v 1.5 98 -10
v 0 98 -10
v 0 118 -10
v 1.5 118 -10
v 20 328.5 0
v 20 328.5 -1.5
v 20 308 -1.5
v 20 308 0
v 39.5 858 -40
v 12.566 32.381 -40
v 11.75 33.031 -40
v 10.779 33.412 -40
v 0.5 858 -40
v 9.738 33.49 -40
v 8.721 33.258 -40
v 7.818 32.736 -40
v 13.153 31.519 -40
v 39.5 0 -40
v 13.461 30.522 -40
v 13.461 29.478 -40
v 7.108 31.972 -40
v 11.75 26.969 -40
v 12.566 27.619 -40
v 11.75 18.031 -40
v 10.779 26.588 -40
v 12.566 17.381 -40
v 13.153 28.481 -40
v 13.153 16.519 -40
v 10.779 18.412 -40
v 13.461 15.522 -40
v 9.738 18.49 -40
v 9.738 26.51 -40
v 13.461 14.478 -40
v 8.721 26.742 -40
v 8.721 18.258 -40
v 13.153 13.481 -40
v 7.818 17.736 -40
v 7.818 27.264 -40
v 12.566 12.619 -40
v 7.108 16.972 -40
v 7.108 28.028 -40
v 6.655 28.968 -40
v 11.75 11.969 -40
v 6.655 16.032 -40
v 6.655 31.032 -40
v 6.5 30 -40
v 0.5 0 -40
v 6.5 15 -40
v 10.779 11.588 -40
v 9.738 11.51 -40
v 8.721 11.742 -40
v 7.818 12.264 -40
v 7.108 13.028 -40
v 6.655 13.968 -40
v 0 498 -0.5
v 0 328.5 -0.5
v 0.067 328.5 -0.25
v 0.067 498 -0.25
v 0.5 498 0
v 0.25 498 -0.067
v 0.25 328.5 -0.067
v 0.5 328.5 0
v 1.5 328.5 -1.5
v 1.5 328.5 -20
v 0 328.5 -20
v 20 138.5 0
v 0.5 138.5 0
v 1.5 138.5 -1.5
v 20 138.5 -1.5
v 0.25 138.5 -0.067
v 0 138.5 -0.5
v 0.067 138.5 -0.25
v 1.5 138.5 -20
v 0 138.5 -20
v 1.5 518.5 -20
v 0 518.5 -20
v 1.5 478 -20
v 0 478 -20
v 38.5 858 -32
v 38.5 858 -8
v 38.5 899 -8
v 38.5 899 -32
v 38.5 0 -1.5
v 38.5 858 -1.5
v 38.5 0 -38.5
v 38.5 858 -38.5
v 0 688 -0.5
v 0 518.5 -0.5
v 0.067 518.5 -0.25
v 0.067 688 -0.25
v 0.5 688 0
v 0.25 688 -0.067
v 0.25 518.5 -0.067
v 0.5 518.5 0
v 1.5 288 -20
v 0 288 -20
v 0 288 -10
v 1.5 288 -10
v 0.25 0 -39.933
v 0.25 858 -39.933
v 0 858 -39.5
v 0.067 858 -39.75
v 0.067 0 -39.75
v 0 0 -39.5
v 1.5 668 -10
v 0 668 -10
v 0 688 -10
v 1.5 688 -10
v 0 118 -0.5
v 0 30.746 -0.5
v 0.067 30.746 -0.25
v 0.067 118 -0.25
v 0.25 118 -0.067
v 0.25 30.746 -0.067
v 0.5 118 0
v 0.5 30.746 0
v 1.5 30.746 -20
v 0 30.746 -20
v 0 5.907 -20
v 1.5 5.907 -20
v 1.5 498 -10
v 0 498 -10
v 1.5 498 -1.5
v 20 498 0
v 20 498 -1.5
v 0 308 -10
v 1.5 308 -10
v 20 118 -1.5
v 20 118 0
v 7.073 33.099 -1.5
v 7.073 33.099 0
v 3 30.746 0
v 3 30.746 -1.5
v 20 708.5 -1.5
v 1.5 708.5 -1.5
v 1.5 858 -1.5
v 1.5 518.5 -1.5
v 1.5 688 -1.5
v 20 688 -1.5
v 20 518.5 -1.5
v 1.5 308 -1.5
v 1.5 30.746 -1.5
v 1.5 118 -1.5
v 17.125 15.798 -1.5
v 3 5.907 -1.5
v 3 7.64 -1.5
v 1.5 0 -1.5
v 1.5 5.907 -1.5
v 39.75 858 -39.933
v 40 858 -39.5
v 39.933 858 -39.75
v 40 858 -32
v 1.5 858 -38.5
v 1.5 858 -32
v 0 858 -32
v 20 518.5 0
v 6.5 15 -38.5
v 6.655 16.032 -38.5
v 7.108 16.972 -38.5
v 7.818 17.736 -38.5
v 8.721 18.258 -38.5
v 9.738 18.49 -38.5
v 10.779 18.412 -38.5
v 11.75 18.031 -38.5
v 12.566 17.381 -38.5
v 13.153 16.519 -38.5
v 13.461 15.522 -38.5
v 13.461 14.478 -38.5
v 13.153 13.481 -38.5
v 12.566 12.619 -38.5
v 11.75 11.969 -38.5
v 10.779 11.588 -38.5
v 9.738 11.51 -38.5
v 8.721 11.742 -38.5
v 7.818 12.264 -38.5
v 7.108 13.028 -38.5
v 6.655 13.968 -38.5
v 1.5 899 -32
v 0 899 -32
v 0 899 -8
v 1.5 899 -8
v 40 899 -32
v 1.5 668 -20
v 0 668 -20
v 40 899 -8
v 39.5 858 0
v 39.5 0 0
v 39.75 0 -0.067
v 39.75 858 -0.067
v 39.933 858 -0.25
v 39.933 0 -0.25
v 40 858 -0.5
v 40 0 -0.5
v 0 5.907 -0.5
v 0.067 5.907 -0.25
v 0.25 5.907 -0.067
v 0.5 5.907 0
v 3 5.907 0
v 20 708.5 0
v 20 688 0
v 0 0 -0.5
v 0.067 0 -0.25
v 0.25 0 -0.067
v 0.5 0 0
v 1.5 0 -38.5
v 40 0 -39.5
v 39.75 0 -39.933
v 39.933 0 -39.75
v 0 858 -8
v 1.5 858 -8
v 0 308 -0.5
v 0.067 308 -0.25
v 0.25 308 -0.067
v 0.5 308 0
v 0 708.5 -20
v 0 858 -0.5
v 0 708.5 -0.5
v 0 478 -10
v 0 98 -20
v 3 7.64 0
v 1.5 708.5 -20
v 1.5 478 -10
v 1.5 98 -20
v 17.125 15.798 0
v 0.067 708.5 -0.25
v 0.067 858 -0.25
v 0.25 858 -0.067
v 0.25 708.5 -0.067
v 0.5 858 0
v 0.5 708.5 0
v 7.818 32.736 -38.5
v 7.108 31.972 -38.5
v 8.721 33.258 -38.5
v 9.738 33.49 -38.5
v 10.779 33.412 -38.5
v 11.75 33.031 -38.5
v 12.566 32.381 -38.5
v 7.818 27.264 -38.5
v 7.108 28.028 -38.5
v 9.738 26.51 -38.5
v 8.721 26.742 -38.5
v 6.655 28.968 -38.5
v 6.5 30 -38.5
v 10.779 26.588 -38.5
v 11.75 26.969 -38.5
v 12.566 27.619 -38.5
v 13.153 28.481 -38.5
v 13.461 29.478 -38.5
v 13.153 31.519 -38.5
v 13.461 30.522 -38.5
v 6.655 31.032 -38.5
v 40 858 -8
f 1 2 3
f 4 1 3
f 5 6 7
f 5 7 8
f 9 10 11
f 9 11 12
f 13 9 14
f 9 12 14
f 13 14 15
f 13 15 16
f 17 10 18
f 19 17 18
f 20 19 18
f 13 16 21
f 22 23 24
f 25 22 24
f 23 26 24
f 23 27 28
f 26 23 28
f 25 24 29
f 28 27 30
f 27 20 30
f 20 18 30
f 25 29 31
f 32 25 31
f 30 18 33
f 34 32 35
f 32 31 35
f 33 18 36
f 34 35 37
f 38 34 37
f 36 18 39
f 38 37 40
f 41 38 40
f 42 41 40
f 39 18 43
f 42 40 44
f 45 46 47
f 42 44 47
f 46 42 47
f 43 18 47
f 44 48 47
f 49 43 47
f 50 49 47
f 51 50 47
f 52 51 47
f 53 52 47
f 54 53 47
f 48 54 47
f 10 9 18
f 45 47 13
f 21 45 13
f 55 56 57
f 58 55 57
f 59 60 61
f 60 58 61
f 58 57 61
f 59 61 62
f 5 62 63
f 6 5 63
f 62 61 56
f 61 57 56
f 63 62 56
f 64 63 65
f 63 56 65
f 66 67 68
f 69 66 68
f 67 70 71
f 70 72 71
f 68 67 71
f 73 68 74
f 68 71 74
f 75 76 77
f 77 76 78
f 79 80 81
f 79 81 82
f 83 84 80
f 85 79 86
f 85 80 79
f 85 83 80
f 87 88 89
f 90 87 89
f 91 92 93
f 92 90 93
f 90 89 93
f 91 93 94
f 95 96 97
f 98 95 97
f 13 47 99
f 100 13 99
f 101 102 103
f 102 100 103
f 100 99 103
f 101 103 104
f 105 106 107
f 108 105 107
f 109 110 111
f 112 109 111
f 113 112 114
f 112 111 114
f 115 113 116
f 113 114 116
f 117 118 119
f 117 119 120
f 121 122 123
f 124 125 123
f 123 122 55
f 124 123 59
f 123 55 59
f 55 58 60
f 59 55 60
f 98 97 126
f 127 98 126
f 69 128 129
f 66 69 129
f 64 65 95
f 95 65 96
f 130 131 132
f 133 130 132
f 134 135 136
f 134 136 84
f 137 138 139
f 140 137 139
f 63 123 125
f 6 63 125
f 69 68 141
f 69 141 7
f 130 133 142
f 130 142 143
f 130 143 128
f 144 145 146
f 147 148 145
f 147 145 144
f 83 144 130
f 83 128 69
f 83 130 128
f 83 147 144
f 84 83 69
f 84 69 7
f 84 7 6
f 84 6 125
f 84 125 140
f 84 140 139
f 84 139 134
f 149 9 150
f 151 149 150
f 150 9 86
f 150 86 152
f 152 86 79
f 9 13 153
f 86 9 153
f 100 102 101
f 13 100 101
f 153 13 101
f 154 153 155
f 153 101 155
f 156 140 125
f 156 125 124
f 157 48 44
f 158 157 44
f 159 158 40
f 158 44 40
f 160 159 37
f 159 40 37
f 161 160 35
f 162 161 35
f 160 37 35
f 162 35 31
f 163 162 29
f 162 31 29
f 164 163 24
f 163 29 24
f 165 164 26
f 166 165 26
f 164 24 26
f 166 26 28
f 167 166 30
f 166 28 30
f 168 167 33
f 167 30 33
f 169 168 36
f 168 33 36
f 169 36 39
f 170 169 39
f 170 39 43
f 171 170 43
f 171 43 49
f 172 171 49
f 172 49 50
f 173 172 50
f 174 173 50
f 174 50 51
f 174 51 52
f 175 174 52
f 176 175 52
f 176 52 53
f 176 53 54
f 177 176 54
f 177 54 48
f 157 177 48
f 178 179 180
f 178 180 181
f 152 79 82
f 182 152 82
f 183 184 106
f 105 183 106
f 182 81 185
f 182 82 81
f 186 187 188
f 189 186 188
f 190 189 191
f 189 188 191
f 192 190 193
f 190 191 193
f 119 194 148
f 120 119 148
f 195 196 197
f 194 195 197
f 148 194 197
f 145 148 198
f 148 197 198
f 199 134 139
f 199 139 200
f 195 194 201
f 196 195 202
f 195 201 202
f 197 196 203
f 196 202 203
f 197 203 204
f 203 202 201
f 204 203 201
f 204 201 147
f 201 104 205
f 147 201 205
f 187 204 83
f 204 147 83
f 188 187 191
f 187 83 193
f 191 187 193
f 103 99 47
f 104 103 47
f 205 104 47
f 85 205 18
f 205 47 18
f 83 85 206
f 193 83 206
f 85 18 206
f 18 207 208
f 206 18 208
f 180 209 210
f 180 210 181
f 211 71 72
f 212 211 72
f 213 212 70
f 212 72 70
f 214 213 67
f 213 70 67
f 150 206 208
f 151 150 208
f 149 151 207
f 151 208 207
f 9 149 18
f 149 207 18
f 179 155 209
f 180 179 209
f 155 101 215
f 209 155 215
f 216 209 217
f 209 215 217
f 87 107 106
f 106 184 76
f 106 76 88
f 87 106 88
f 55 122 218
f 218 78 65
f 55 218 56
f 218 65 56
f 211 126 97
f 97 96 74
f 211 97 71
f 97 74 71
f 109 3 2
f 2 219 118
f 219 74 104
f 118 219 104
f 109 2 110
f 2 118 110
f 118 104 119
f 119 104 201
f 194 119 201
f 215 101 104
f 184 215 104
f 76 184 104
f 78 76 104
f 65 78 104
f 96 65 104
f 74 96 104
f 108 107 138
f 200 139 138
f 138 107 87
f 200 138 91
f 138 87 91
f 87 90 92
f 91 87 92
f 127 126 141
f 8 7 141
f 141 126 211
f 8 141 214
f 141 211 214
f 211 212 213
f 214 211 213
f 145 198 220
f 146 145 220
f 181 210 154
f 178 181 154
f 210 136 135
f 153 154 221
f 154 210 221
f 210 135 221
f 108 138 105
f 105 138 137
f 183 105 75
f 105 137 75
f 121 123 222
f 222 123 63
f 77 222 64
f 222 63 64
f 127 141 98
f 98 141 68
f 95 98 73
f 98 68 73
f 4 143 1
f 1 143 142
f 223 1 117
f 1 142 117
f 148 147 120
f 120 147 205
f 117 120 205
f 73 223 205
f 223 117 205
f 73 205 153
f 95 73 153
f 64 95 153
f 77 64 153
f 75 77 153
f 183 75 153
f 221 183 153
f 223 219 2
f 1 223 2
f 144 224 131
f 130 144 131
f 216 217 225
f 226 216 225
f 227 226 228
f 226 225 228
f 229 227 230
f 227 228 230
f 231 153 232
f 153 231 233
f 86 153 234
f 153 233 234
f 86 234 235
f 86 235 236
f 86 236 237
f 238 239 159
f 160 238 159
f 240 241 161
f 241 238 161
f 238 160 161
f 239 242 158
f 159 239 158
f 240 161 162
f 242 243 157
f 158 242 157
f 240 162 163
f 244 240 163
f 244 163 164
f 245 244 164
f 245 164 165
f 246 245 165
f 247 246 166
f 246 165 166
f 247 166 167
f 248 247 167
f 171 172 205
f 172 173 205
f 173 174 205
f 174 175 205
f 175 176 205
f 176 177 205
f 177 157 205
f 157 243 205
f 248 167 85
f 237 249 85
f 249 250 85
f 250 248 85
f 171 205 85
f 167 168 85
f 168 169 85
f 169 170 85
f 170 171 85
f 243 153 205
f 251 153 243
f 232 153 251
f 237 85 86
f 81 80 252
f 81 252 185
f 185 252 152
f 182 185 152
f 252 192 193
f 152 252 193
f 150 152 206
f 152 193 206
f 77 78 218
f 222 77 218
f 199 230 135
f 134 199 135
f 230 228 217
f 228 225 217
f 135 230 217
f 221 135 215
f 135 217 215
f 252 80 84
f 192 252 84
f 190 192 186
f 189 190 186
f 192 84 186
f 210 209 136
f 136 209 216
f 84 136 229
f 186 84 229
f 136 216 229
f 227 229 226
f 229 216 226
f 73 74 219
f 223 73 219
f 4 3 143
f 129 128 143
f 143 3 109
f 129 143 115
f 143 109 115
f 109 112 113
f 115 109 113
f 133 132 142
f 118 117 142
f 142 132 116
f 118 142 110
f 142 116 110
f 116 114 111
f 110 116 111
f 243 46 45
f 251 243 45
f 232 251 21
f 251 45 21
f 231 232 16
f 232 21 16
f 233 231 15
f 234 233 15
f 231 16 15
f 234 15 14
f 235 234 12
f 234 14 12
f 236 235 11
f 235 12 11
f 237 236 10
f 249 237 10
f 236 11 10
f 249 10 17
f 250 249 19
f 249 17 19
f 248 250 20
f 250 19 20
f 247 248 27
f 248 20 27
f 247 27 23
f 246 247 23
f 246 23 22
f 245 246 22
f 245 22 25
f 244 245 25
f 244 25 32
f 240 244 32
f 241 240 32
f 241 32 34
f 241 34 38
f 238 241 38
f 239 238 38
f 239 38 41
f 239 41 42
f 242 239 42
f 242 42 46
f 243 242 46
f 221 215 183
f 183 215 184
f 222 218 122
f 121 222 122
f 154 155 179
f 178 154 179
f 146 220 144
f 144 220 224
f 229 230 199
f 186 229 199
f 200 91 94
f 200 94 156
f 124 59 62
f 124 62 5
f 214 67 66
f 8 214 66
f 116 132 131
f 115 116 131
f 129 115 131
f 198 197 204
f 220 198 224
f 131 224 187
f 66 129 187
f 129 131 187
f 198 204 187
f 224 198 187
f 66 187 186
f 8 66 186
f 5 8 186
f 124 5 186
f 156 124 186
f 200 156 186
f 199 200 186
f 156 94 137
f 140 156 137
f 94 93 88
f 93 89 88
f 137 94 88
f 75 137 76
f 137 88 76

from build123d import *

# Parameters (mm, degrees)
SKETCH1_W           = 37
SKETCH1_H           = 37
BOSS_EXTRUDE1_DEPTH = 899
CUT_EXTRUDE2_DEPTH  = 20
SKETCH4_W           = 8
SKETCH4_H           = 41
CUT_EXTRUDE3_DEPTH  = 901.777997067
SKETCH5_R           = 3.5
CUT_EXTRUDE4_DEPTH  = 10
CUT_EXTRUDE5_DEPTH  = 20


with BuildPart() as part:
    # Sketch1 → Boss-Extrude1 (new body)
    with BuildSketch(Plane(origin=(0, 0, 0), x_dir=(1, 0, 0), z_dir=(0, 1, 0))):
        with BuildLine():
            Line((0.5, 0), (39.5, 0))
            ThreePointArc((39.5, 0), (39.853553391, 0.146446609), (40, 0.5))
            Line((40, 0.5), (40, 39.5))
            ThreePointArc((40, 39.5), (39.853553391, 39.853553391), (39.5, 40))
            Line((39.5, 40), (0.5, 40))
            ThreePointArc((0.5, 40), (0.146446609, 39.853553391), (0, 39.5))
            Line((0, 39.5), (0, 0.5))
            ThreePointArc((0, 0.5), (0.146446609, 0.146446609), (0.5, 0))
        make_face()
        with Locations((20, 20)):
            Rectangle(SKETCH1_W, SKETCH1_H, mode=Mode.SUBTRACT)
    extrude(amount=BOSS_EXTRUDE1_DEPTH)

    # Sketch3 → Cut-Extrude2 (cut)
    with BuildSketch(Plane.XY):
        Polygon((0, 29.014346333), (0, 5.907288086), (3, 5.907288086), (3, 7.639845548), (17.125490967, 15.797587142), (7.072929751, 33.098592085), (3, 30.74639714), (0, 30.74639714), align=None)
    extrude(amount=-CUT_EXTRUDE2_DEPTH, mode=Mode.SUBTRACT)

    # Sketch4 → Cut-Extrude3 (cut, through all)
    with BuildSketch(Plane.ZY):
        with Locations((-4, 878.5)):
            Rectangle(SKETCH4_W, SKETCH4_H)
        with Locations((-36, 878.5)):
            Rectangle(SKETCH4_W, SKETCH4_H)
    extrude(amount=-CUT_EXTRUDE3_DEPTH, mode=Mode.SUBTRACT)

    # Sketch5 → Cut-Extrude4 (cut)
    with BuildSketch(Plane(origin=(0, 0, -40), x_dir=(-1, 0, 0), z_dir=(0, 0, -1))):
        with Locations((-10, 30)):
            Circle(SKETCH5_R)
        with Locations((-10, 15)):
            Circle(SKETCH5_R)
    extrude(amount=-CUT_EXTRUDE4_DEPTH, mode=Mode.SUBTRACT)

    # Sketch6 → Cut-Extrude5 (cut)
    with BuildSketch(Plane.ZY):
        Polygon((0, 708.5), (-20, 708.5), (-20, 668), (-10, 668), (-10, 688), (0, 688), align=None)
        Polygon((0, 518.5), (-20, 518.5), (-20, 478), (-10, 478), (-10, 498), (0, 498), align=None)
        Polygon((0, 328.5), (-20, 328.5), (-20, 288), (-10, 288), (-10, 308), (0, 308), align=None)
        Polygon((0, 138.5), (-20, 138.5), (-20, 98), (-10, 98), (-10, 118), (0, 118), align=None)
    extrude(amount=-CUT_EXTRUDE5_DEPTH, mode=Mode.SUBTRACT)


solid = part.part
